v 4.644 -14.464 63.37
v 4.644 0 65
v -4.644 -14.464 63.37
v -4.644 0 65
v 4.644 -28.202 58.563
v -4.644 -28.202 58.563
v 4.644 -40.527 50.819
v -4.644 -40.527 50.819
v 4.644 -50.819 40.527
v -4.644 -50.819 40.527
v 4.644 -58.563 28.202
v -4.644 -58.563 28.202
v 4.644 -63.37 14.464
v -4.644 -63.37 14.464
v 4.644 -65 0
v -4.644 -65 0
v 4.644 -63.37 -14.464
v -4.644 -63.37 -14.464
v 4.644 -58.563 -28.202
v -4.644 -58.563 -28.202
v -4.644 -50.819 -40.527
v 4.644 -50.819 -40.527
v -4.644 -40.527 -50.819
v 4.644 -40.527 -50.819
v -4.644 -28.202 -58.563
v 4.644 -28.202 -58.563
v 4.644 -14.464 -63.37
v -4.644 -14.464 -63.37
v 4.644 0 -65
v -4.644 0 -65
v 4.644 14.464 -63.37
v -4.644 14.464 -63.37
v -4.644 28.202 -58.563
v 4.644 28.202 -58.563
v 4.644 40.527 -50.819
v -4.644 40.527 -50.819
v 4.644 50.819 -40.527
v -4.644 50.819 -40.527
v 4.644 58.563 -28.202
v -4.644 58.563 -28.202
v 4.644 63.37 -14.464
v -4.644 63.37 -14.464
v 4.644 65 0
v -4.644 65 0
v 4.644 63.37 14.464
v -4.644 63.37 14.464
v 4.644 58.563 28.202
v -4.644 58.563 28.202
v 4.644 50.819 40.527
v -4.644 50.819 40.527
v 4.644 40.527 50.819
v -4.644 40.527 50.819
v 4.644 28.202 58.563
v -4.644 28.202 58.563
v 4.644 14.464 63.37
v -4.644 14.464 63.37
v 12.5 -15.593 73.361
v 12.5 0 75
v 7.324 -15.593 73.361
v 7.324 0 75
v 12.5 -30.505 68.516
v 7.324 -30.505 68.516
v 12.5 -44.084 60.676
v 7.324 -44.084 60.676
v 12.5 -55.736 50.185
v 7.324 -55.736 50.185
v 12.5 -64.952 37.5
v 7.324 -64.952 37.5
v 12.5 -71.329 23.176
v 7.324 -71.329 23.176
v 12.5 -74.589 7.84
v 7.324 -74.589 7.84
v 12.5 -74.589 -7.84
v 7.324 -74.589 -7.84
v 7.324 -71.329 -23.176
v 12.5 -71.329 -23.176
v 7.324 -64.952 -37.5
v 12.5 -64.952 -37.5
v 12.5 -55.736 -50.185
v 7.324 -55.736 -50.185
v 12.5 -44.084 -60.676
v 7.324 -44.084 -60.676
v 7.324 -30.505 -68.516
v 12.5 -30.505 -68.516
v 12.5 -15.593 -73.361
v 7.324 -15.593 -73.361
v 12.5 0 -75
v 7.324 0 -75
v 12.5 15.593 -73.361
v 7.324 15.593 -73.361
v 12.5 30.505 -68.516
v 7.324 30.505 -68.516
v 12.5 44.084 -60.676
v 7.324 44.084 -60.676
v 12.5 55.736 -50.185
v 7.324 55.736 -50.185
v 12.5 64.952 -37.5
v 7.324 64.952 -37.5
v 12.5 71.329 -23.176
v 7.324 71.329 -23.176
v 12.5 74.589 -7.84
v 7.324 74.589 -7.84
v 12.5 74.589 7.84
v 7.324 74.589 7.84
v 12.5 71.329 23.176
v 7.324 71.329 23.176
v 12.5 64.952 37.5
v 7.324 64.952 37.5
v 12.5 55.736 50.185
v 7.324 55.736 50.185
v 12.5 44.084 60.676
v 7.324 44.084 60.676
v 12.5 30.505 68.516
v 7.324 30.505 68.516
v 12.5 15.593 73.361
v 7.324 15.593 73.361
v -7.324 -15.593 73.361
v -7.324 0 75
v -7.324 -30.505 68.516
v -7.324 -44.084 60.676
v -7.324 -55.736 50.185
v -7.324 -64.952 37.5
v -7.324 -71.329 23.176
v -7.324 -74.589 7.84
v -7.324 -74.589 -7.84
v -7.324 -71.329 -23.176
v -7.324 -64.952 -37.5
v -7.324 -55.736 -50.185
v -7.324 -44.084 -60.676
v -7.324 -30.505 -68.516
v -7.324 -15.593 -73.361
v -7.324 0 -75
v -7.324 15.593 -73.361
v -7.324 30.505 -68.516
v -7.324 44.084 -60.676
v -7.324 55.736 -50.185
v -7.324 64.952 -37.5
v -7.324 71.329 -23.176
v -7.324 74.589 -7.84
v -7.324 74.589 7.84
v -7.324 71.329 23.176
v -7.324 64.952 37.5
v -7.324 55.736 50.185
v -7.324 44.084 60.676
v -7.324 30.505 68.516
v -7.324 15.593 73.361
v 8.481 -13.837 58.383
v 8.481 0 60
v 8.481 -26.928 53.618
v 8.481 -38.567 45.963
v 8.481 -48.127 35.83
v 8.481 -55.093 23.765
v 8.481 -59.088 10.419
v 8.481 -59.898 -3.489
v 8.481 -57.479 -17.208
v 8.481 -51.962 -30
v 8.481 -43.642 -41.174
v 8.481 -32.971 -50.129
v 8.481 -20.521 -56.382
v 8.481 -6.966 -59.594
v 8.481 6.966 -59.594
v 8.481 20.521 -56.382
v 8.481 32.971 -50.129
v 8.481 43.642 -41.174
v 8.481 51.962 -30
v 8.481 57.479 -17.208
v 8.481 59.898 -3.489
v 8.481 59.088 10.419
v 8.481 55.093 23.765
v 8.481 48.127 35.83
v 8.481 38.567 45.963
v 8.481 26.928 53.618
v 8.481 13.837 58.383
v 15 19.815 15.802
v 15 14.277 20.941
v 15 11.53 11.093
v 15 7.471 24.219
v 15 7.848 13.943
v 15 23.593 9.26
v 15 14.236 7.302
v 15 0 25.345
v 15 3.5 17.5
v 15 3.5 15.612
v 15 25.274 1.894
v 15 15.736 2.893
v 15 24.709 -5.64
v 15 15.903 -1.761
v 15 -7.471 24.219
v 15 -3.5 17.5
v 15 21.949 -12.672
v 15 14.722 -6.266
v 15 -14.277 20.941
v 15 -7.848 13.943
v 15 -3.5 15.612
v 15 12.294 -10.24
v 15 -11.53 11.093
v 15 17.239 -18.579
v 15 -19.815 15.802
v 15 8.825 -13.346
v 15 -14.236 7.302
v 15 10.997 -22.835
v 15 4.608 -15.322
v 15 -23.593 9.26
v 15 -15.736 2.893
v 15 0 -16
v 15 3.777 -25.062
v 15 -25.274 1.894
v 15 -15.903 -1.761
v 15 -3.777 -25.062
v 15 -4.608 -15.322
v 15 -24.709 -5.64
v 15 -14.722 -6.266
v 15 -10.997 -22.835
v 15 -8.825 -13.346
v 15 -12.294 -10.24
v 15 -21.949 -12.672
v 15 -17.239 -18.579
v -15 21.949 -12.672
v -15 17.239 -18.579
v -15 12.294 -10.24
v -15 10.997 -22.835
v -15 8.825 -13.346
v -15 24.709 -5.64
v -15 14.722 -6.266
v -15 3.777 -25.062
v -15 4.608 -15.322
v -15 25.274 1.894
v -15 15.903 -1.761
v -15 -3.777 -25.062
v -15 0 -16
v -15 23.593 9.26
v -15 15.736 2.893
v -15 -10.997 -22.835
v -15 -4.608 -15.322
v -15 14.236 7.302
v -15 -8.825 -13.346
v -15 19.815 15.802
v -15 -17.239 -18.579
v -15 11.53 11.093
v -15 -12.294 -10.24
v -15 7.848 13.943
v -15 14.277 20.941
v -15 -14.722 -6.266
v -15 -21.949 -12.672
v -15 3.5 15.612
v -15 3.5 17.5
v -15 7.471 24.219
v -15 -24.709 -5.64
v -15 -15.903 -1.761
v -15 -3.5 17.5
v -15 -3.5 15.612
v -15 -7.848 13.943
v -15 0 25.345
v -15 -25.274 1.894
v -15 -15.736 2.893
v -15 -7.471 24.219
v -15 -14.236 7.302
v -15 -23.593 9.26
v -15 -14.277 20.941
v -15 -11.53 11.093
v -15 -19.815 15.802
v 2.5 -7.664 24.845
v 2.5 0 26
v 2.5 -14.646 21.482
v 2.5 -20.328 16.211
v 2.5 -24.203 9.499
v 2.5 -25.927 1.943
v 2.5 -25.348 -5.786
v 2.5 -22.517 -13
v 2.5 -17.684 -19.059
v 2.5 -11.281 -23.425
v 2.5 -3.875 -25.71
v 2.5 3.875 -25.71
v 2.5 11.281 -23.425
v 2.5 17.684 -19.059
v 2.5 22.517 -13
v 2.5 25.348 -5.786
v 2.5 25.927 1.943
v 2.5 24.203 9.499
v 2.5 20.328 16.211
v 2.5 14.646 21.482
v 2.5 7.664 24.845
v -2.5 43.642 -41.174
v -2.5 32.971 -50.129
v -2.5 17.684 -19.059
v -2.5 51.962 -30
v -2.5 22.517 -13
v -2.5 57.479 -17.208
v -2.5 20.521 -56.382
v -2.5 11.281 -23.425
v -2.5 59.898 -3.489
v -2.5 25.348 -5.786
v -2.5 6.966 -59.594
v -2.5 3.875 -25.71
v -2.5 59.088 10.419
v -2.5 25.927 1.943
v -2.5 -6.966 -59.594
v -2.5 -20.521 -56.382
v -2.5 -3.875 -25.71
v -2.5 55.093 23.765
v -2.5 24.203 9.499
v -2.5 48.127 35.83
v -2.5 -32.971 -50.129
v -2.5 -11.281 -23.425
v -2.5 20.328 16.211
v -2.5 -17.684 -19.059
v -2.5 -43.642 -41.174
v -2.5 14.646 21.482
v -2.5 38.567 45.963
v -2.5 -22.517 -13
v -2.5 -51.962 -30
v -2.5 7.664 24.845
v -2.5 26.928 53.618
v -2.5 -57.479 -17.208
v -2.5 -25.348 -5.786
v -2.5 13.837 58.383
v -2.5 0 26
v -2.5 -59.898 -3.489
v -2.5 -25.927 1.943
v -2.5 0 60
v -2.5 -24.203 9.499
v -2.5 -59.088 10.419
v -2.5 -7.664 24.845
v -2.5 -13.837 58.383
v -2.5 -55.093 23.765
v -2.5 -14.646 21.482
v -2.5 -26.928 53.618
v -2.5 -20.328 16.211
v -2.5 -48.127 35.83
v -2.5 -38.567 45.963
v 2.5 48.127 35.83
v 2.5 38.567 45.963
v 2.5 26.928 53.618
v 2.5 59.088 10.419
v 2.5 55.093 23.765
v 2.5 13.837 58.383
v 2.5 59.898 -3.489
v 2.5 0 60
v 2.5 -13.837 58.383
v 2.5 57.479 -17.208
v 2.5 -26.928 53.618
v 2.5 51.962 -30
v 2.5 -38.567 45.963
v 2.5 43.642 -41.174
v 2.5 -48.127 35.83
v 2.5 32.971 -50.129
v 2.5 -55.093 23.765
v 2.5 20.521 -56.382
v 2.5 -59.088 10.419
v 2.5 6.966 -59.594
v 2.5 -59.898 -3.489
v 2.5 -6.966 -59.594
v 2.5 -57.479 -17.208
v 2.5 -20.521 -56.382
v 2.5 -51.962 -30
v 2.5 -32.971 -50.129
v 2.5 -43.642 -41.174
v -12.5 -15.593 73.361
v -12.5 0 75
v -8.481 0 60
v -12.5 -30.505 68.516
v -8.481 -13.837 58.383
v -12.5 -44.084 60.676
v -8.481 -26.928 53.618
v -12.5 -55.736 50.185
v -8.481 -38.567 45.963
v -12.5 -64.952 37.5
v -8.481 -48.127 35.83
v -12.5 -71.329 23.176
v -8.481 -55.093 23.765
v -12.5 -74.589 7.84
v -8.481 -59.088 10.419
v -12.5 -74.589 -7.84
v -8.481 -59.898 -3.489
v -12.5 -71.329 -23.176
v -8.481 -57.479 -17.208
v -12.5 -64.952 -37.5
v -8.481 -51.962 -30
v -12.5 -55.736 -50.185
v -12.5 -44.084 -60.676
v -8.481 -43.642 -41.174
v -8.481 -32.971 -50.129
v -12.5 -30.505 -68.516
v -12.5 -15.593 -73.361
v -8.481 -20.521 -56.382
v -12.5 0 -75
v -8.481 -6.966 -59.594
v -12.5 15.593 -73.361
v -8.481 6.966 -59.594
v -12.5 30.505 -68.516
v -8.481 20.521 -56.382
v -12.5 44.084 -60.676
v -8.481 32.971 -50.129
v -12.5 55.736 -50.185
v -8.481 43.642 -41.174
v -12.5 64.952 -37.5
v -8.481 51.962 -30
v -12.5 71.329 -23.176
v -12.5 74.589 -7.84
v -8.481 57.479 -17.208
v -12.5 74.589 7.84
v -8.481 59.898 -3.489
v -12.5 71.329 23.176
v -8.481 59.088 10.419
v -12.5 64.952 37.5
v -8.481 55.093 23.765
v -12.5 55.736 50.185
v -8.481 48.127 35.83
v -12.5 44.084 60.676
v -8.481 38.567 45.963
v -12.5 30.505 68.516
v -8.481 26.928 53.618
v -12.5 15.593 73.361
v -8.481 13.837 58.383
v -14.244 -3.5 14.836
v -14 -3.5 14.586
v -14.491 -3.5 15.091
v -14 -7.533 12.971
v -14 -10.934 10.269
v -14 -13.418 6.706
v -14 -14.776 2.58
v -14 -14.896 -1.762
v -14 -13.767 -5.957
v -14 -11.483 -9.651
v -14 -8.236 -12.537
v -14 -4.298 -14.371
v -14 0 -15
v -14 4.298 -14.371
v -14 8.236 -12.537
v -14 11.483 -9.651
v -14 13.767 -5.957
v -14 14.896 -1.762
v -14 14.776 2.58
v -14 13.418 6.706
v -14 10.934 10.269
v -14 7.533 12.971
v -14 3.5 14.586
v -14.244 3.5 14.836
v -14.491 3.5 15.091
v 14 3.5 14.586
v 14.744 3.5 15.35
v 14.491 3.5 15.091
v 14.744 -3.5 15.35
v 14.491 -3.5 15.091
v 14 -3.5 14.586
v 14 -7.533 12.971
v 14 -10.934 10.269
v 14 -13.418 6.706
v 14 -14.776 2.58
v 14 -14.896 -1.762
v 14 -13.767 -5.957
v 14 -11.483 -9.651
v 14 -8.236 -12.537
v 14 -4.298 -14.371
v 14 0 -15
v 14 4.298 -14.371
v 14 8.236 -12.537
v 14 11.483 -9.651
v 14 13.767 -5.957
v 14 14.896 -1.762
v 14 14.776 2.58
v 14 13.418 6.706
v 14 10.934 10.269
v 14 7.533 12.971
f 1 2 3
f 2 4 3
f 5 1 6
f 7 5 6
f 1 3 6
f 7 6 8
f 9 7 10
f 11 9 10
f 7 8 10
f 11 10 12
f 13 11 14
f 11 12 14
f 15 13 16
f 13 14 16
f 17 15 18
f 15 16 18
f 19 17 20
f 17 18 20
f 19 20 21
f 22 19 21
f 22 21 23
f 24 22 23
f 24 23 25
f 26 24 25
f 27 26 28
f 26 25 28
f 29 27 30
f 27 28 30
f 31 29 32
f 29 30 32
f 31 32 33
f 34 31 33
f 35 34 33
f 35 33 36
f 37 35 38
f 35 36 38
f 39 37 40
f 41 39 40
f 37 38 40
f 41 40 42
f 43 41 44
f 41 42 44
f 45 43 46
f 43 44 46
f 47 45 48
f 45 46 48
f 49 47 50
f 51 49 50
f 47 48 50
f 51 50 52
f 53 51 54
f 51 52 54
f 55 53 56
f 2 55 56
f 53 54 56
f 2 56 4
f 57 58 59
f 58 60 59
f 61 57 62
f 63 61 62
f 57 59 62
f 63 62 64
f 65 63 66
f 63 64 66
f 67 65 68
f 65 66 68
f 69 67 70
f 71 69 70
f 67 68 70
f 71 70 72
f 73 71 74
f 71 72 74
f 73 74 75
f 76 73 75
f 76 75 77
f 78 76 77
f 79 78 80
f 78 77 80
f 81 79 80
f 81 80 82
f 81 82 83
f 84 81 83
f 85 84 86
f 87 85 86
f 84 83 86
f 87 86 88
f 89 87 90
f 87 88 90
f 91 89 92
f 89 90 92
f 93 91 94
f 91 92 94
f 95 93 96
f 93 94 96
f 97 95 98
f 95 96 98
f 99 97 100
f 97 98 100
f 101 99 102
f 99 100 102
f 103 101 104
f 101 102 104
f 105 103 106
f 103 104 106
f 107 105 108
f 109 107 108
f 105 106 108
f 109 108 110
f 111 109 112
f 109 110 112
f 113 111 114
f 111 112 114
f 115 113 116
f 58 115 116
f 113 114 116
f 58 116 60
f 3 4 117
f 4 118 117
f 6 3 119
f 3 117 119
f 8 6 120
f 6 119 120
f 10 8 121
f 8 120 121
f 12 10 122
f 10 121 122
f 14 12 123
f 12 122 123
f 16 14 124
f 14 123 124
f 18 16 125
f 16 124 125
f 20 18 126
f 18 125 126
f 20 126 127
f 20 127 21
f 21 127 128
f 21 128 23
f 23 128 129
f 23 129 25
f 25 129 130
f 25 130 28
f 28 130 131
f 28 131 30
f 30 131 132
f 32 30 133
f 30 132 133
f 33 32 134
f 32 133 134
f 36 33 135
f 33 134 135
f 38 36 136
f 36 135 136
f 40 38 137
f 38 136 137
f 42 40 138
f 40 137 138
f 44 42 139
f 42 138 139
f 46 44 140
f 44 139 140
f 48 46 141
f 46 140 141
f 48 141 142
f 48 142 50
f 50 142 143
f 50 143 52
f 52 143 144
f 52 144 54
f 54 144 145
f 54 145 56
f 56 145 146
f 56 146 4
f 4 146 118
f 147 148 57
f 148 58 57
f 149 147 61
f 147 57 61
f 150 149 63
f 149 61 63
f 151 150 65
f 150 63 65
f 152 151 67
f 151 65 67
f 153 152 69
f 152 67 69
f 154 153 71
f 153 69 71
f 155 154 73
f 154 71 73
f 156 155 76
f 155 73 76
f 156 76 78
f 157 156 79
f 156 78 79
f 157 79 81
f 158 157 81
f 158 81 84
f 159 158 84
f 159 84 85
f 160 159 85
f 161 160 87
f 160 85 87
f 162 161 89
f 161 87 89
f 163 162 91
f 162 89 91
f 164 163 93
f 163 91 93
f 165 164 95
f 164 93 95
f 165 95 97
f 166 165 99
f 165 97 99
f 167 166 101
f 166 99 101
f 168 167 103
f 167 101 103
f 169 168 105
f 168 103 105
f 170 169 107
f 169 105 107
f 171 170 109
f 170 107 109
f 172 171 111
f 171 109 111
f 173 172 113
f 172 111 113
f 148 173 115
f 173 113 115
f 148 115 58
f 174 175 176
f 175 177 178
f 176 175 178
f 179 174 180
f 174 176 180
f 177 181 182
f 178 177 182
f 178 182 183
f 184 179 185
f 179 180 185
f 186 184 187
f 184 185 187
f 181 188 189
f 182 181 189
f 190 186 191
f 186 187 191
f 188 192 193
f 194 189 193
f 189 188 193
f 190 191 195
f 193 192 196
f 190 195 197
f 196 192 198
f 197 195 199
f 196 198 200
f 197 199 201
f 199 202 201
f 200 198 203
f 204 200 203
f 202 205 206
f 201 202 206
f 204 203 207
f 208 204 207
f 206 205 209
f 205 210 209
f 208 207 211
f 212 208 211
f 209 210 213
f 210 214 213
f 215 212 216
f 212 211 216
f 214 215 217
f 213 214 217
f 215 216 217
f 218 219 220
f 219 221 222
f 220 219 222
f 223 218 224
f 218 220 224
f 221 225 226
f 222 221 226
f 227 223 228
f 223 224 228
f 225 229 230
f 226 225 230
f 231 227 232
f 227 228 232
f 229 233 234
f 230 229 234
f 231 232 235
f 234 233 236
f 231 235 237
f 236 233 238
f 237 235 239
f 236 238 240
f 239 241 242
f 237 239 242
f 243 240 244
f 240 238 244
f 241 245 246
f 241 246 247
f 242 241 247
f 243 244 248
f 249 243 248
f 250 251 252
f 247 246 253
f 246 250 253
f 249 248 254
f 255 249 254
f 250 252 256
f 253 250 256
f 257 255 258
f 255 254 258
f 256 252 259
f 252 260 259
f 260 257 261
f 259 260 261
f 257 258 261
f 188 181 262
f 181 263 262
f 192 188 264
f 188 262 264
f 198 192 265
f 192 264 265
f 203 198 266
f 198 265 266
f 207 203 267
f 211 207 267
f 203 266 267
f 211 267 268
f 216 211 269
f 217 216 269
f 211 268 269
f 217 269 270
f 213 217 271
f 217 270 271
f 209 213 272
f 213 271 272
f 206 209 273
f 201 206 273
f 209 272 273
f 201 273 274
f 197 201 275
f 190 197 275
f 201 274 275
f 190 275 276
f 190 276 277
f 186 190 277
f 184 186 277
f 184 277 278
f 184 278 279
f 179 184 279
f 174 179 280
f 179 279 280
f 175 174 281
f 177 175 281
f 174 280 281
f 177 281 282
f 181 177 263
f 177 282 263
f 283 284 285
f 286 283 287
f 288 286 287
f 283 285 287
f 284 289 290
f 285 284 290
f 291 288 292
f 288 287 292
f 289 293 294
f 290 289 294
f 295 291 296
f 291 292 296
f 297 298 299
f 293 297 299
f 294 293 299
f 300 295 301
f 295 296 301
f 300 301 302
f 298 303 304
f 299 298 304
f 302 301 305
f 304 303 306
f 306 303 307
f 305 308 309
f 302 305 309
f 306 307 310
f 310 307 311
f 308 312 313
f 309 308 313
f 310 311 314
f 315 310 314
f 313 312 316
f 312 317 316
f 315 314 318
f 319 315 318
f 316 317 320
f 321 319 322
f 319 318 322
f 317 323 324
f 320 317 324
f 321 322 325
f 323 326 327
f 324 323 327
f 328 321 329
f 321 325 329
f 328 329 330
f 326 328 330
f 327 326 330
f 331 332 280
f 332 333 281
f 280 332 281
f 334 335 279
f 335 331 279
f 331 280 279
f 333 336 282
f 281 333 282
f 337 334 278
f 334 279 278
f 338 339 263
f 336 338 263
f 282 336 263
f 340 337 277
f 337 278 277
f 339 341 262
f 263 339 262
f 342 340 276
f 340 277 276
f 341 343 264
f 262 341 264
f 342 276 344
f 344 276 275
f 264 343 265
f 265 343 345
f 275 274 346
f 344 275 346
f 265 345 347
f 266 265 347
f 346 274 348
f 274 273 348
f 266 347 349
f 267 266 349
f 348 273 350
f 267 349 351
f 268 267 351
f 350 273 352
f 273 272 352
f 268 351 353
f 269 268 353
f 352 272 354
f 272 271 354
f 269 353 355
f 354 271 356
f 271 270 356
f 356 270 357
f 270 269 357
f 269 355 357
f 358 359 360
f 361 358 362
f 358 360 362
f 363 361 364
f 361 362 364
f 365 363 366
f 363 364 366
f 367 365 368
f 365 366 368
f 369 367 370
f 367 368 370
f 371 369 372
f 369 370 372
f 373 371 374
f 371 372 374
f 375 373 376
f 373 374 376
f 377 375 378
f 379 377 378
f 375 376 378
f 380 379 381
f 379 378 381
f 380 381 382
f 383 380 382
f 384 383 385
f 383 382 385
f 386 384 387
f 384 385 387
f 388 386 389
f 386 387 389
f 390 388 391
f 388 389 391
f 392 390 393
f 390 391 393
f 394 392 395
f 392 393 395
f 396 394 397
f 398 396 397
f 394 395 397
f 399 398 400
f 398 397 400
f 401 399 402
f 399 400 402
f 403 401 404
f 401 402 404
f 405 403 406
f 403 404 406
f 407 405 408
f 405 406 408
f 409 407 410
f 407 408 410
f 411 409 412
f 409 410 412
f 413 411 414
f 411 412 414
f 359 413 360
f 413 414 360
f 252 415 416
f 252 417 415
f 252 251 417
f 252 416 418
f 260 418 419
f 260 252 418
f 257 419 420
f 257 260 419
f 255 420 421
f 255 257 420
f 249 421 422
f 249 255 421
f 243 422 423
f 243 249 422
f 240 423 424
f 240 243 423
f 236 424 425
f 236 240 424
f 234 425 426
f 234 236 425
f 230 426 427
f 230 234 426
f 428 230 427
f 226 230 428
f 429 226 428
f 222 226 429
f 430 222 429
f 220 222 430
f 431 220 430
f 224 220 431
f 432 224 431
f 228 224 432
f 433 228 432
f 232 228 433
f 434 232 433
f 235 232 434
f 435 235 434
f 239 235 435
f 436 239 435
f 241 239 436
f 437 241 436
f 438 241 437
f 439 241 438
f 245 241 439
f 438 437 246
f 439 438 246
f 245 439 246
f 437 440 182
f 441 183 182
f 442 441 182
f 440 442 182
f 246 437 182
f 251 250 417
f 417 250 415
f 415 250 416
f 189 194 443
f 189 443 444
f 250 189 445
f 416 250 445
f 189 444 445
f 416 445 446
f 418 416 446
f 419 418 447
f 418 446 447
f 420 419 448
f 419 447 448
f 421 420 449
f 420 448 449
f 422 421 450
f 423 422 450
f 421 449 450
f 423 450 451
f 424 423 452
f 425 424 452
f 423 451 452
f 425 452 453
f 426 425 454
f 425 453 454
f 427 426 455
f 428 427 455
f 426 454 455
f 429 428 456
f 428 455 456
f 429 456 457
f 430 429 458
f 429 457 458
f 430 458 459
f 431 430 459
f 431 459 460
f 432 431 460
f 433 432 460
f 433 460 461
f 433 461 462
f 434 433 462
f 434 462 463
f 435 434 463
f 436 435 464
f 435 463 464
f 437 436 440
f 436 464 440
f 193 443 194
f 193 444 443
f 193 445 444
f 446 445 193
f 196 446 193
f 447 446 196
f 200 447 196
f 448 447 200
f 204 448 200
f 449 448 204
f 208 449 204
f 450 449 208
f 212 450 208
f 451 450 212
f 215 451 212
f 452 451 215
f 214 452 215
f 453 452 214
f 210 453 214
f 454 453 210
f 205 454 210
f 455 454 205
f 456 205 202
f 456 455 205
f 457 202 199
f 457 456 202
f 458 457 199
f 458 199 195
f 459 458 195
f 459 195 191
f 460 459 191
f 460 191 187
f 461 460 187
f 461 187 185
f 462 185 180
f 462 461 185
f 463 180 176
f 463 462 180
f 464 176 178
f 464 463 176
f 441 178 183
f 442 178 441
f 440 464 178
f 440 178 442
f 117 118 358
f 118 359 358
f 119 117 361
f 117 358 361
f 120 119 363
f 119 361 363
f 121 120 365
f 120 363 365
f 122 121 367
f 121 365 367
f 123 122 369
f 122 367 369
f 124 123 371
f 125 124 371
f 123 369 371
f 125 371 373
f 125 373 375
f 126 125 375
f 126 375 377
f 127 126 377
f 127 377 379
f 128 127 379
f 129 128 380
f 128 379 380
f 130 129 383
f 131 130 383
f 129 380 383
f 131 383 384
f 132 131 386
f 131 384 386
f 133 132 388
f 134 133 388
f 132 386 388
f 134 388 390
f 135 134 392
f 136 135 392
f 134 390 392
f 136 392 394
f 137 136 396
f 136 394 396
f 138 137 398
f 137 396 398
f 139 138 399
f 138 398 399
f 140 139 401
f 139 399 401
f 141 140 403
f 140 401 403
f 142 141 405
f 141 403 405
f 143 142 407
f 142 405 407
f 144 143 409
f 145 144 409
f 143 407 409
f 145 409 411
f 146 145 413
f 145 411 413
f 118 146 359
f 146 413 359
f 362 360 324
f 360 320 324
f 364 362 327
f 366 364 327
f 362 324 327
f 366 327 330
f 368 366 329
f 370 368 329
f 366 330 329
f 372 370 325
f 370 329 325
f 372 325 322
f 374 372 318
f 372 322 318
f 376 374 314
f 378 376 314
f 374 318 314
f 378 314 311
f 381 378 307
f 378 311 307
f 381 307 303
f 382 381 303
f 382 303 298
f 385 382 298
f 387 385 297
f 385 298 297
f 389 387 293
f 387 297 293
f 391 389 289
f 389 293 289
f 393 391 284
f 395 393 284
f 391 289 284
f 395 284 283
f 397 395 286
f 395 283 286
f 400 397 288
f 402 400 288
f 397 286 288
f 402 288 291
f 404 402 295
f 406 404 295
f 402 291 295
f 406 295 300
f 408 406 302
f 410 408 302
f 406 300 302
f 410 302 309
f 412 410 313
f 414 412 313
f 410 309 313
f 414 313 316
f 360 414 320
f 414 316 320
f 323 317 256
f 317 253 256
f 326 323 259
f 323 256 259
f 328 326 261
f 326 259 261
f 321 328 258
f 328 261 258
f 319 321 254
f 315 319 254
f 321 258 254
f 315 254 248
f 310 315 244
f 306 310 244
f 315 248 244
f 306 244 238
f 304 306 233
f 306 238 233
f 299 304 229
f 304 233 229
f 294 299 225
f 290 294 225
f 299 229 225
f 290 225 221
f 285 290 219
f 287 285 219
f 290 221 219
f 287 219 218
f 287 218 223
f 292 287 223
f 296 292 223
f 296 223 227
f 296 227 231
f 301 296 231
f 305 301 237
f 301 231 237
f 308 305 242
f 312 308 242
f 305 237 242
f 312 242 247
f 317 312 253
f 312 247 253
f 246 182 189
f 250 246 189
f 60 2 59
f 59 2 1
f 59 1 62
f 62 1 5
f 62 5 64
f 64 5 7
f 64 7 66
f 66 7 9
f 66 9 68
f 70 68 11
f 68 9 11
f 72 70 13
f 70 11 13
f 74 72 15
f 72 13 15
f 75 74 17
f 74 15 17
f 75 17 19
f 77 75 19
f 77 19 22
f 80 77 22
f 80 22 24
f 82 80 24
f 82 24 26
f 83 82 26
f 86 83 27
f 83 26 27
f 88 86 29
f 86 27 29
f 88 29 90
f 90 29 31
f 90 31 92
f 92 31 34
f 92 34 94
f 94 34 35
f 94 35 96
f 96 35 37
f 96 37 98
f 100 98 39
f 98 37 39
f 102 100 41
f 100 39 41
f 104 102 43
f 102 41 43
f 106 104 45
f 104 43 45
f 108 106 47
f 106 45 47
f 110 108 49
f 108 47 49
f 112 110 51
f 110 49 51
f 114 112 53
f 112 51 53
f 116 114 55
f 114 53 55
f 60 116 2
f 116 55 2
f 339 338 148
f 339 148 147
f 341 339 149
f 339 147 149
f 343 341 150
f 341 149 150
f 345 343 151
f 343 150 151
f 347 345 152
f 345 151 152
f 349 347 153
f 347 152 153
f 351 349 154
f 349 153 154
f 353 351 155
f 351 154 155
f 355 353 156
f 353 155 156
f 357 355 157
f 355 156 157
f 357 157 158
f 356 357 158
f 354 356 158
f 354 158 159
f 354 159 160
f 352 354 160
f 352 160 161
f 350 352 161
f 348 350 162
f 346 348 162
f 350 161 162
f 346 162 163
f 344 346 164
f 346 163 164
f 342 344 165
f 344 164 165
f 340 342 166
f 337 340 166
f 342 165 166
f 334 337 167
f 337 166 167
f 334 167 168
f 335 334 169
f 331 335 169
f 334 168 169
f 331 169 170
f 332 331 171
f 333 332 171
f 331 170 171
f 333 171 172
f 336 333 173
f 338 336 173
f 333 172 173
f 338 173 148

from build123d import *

# Parameters (mm, degrees)
CUT_EXTRUDE1_DEPTH = 30
CHAMFER1_SIZE      = 1
CHAMFER2_SIZE      = 1


with BuildPart() as part:
    # Sketch1 → Revolve1 (revolve)
    with BuildSketch(Plane.XY, mode=Mode.PRIVATE) as revolve1_sk:
        Polygon((15, 15), (15, 25.344902759), (2.5, 26), (2.5, 60), (8.480762114, 60), (12.5, 75), (7.323619098, 75), (4.644127174, 65), (-4.644127174, 65), (-7.323619098, 75), (-12.5, 75), (-8.480762114, 60), (-2.5, 60), (-2.5, 26), (-15, 25.344902759), (-15, 15), align=None)
    revolve(revolve1_sk.sketch.rotate(Axis((0, 0, 0), (1, 0, 0)), 90), axis=Axis((0, 0, 0), (1, 0, 0)))

    # Sketch2 → Cut-Extrude1 (cut)
    with BuildSketch(Plane(origin=(15, 0, 0), x_dir=(0, 0, -1), z_dir=(1, 0, 0))):
        with BuildLine():
            Line((-14.585952146, 3.5), (-17.5, 3.5))
            Line((-17.5, 3.5), (-17.5, -3.5))
            Line((-17.5, -3.5), (-14.585952146, -3.5))
            ThreePointArc((-14.585952146, -3.5), (15, 0), (-14.585952146, 3.5))
        make_face()
    extrude(amount=-CUT_EXTRUDE1_DEPTH, mode=Mode.SUBTRACT)

    # Chamfer1
    chamfer1_edges = [part.edges().sort_by_distance(p)[0] for p in [
        (15, 0, -15),
    ]]
    chamfer(chamfer1_edges, length=CHAMFER1_SIZE)

    # Chamfer2
    chamfer2_edges = [part.edges().sort_by_distance(p)[0] for p in [
        (-15, 0, -15),
    ]]
    chamfer(chamfer2_edges, length=CHAMFER2_SIZE)


solid = part.part
